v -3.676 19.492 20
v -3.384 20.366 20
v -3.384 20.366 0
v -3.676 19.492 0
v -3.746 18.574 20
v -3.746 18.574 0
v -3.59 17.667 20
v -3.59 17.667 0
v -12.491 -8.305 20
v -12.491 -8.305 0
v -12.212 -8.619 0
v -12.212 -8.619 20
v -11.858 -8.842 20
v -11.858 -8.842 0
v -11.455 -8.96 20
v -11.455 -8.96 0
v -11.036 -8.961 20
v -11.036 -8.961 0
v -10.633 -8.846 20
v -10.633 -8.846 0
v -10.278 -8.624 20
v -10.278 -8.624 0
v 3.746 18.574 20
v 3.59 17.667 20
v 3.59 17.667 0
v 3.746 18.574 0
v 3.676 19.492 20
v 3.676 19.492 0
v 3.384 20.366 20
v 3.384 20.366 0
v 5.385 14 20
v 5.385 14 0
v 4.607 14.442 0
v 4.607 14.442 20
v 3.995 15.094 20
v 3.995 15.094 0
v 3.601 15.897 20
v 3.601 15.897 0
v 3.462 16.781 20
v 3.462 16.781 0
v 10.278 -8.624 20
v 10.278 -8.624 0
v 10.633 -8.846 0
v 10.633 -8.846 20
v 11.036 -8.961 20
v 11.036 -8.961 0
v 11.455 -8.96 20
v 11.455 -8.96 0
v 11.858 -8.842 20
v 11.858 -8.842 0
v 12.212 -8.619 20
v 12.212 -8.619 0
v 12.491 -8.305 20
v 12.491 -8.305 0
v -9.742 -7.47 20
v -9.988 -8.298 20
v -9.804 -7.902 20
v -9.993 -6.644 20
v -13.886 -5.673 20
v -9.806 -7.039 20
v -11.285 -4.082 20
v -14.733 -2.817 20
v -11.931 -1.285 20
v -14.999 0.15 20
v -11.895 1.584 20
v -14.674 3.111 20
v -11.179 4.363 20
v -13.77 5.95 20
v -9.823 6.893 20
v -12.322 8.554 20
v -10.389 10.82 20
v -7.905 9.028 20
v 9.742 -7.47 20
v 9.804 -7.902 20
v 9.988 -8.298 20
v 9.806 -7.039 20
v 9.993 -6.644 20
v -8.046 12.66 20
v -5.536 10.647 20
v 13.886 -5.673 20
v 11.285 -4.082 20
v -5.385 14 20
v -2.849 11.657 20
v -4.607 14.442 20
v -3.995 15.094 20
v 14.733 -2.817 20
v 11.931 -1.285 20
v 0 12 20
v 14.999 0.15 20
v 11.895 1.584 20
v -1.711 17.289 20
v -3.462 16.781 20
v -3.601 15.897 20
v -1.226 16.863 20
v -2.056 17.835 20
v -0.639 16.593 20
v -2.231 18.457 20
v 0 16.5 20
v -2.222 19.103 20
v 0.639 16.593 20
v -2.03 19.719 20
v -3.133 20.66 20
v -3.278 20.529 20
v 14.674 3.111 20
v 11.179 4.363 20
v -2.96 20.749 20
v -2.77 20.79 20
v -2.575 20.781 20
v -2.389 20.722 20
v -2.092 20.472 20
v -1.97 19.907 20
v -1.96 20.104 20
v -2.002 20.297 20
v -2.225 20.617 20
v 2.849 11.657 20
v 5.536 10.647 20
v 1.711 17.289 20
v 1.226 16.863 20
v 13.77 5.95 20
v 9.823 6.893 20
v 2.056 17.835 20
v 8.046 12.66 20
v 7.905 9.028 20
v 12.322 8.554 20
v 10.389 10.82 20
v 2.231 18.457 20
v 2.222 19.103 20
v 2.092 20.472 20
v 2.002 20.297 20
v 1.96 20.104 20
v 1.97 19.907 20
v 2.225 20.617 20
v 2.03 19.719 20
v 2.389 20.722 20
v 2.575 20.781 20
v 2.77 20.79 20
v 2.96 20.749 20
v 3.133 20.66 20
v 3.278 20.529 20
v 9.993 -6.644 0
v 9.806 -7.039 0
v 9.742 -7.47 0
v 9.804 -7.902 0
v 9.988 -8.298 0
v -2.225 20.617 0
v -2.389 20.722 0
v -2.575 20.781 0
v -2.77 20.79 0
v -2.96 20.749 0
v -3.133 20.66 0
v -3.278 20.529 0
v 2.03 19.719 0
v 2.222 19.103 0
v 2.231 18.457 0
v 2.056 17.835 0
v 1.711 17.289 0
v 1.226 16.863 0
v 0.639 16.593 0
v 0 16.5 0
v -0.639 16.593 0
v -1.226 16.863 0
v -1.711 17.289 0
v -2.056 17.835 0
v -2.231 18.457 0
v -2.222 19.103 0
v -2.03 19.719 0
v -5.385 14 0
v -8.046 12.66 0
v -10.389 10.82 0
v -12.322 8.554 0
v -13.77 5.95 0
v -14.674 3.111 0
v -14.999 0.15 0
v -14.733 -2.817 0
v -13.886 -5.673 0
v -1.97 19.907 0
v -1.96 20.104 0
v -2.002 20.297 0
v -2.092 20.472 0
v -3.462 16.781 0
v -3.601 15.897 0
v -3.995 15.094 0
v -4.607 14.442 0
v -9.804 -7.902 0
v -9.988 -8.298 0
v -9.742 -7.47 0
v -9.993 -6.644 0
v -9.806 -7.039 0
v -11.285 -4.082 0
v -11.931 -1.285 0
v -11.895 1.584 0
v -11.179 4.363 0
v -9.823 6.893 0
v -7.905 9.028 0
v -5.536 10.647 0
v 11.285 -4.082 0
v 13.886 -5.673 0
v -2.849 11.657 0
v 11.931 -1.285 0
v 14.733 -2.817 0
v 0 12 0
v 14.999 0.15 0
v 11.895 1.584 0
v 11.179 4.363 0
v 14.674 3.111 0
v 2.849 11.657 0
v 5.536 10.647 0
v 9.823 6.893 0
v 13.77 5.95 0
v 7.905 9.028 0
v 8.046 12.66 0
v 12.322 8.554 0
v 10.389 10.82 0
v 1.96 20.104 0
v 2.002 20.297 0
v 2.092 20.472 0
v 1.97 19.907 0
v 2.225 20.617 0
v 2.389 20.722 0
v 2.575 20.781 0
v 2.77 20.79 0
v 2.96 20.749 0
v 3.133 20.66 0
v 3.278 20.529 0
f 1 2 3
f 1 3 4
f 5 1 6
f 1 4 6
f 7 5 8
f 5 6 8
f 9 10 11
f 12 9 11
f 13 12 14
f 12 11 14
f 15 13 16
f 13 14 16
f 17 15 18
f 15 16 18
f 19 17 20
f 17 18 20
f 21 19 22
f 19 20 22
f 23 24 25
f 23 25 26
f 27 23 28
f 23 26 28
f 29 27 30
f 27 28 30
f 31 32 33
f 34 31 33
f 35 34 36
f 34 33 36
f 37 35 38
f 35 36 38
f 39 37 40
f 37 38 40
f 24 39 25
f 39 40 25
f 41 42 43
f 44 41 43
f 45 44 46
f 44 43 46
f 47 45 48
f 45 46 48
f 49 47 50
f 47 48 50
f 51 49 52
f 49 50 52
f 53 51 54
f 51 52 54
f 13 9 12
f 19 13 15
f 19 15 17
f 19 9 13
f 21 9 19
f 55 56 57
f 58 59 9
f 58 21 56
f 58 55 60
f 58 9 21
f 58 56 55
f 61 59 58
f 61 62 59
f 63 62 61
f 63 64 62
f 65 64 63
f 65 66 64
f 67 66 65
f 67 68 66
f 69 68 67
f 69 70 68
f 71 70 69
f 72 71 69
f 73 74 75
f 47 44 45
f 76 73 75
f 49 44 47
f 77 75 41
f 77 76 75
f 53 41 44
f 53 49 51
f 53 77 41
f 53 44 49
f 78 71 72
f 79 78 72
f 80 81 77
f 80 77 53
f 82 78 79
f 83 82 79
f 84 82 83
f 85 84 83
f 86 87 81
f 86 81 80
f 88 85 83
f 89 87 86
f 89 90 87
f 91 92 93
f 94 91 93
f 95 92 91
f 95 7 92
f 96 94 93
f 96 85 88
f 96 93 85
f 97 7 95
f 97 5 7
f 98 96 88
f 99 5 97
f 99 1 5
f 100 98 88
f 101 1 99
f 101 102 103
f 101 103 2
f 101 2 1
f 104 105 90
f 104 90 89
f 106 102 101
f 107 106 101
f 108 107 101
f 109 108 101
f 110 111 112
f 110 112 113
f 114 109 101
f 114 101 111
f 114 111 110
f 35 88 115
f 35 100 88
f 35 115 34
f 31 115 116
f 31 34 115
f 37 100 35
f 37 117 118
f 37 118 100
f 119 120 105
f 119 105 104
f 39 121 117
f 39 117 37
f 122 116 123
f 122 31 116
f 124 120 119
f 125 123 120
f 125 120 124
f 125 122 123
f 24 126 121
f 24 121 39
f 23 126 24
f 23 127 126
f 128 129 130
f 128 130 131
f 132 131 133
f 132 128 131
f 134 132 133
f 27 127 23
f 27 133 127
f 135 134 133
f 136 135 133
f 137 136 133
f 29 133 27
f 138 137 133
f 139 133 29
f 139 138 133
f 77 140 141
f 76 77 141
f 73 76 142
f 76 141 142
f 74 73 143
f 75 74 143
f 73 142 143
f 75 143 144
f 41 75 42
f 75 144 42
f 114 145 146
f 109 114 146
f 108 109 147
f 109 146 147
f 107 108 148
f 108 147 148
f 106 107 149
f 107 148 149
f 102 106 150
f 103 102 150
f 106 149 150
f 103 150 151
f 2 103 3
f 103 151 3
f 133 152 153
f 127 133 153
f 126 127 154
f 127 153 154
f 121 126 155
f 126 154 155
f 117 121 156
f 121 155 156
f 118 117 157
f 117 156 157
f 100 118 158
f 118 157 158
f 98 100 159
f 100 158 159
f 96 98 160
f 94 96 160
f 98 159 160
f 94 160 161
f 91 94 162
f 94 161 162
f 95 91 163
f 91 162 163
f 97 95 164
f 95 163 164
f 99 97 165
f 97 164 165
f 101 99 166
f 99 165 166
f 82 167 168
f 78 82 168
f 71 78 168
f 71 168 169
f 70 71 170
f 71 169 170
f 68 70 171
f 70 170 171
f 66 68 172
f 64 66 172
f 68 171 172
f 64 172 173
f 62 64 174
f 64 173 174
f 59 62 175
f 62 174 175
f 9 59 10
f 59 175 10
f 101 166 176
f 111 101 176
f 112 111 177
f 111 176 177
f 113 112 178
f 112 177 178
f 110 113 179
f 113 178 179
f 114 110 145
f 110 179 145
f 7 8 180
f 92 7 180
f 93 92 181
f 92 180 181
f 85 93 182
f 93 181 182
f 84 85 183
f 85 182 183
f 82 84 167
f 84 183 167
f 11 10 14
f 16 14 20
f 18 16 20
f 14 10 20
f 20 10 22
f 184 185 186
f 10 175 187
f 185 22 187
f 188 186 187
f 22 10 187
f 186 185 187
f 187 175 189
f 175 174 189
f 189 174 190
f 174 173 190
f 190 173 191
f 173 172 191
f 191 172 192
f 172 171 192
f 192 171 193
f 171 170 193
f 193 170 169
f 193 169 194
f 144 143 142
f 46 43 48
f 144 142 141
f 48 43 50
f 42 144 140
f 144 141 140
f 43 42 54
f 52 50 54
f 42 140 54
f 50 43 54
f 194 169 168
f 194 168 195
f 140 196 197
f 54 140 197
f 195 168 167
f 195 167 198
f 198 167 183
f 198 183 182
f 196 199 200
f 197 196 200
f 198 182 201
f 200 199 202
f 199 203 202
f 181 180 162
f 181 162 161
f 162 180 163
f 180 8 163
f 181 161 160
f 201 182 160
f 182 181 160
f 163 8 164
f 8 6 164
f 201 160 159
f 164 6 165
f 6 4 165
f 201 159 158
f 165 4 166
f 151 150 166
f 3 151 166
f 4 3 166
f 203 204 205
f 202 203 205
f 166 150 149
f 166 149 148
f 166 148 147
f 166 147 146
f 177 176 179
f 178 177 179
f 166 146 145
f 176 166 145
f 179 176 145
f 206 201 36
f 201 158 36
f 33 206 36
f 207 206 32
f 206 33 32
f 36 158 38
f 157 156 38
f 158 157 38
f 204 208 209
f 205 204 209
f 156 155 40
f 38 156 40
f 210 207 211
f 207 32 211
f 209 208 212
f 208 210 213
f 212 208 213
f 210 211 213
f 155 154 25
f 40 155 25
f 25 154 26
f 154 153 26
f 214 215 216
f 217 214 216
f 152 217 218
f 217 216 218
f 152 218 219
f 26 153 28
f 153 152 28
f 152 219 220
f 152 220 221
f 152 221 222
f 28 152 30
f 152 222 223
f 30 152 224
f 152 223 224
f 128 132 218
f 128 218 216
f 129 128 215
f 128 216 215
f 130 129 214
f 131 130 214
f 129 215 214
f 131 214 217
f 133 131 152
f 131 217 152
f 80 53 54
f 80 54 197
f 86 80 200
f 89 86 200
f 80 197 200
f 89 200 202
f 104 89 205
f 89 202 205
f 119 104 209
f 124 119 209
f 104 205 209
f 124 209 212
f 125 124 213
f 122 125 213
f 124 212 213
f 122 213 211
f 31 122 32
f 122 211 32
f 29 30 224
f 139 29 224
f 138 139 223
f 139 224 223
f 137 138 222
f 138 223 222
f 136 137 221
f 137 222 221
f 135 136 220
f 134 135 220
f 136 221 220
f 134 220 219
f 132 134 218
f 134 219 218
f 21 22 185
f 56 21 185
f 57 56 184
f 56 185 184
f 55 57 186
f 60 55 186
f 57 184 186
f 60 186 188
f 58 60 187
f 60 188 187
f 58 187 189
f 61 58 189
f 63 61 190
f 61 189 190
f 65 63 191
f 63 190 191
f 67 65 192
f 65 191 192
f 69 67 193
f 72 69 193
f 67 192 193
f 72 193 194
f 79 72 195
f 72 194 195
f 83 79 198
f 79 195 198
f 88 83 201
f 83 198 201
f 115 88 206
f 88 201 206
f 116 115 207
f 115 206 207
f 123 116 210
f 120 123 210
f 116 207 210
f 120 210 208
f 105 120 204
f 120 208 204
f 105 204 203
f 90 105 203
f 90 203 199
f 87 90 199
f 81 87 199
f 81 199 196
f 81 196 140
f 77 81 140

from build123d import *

# Parameters (mm, degrees)
F1_DEPTH = 20


with BuildPart() as f1:
    # F0 (on Top) → F1 (new body)
    with BuildSketch(Plane.XY):
        with BuildLine():
            ThreePointArc((-9.992663, -6.644297), (0, 12), (9.992663, -6.644297))
            ThreePointArc((9.992663, -6.644297), (9.757043, -7.68851), (10.277565, -8.623901))
            ThreePointArc((10.277565, -8.623901), (11.455422, -8.959537), (12.490829, -8.305371))
            ThreePointArc((12.490829, -8.305371), (14.292312, 4.553001), (5.385165, 14))
            ThreePointArc((5.385165, 14), (3.767759, 15.480909), (3.59011, 17.666667))
            ThreePointArc((3.59011, 17.666667), (3.73912, 19.035446), (3.384061, 20.365745))
            ThreePointArc((3.384061, 20.365745), (2.866238, 20.77555), (2.225158, 20.617129))
            ThreePointArc((2.225158, 20.617129), (1.974294, 20.201585), (2.030437, 19.719447))
            ThreePointArc((2.030437, 19.719447), (0, 16.5), (-2.030437, 19.719447))
            ThreePointArc((-2.030437, 19.719447), (-1.974294, 20.201585), (-2.225158, 20.617129))
            ThreePointArc((-2.225158, 20.617129), (-2.866238, 20.77555), (-3.384061, 20.365745))
            ThreePointArc((-3.384061, 20.365745), (-3.73912, 19.035446), (-3.59011, 17.666667))
            ThreePointArc((-3.59011, 17.666667), (-3.767759, 15.480909), (-5.385165, 14))
            ThreePointArc((-5.385165, 14), (-14.292312, 4.553001), (-12.490829, -8.305371))
            ThreePointArc((-12.490829, -8.305371), (-11.455422, -8.959537), (-10.277565, -8.623901))
            ThreePointArc((-10.277565, -8.623901), (-9.757043, -7.68851), (-9.992663, -6.644297))
        make_face()
    extrude(amount=F1_DEPTH)


solid = f1.part
